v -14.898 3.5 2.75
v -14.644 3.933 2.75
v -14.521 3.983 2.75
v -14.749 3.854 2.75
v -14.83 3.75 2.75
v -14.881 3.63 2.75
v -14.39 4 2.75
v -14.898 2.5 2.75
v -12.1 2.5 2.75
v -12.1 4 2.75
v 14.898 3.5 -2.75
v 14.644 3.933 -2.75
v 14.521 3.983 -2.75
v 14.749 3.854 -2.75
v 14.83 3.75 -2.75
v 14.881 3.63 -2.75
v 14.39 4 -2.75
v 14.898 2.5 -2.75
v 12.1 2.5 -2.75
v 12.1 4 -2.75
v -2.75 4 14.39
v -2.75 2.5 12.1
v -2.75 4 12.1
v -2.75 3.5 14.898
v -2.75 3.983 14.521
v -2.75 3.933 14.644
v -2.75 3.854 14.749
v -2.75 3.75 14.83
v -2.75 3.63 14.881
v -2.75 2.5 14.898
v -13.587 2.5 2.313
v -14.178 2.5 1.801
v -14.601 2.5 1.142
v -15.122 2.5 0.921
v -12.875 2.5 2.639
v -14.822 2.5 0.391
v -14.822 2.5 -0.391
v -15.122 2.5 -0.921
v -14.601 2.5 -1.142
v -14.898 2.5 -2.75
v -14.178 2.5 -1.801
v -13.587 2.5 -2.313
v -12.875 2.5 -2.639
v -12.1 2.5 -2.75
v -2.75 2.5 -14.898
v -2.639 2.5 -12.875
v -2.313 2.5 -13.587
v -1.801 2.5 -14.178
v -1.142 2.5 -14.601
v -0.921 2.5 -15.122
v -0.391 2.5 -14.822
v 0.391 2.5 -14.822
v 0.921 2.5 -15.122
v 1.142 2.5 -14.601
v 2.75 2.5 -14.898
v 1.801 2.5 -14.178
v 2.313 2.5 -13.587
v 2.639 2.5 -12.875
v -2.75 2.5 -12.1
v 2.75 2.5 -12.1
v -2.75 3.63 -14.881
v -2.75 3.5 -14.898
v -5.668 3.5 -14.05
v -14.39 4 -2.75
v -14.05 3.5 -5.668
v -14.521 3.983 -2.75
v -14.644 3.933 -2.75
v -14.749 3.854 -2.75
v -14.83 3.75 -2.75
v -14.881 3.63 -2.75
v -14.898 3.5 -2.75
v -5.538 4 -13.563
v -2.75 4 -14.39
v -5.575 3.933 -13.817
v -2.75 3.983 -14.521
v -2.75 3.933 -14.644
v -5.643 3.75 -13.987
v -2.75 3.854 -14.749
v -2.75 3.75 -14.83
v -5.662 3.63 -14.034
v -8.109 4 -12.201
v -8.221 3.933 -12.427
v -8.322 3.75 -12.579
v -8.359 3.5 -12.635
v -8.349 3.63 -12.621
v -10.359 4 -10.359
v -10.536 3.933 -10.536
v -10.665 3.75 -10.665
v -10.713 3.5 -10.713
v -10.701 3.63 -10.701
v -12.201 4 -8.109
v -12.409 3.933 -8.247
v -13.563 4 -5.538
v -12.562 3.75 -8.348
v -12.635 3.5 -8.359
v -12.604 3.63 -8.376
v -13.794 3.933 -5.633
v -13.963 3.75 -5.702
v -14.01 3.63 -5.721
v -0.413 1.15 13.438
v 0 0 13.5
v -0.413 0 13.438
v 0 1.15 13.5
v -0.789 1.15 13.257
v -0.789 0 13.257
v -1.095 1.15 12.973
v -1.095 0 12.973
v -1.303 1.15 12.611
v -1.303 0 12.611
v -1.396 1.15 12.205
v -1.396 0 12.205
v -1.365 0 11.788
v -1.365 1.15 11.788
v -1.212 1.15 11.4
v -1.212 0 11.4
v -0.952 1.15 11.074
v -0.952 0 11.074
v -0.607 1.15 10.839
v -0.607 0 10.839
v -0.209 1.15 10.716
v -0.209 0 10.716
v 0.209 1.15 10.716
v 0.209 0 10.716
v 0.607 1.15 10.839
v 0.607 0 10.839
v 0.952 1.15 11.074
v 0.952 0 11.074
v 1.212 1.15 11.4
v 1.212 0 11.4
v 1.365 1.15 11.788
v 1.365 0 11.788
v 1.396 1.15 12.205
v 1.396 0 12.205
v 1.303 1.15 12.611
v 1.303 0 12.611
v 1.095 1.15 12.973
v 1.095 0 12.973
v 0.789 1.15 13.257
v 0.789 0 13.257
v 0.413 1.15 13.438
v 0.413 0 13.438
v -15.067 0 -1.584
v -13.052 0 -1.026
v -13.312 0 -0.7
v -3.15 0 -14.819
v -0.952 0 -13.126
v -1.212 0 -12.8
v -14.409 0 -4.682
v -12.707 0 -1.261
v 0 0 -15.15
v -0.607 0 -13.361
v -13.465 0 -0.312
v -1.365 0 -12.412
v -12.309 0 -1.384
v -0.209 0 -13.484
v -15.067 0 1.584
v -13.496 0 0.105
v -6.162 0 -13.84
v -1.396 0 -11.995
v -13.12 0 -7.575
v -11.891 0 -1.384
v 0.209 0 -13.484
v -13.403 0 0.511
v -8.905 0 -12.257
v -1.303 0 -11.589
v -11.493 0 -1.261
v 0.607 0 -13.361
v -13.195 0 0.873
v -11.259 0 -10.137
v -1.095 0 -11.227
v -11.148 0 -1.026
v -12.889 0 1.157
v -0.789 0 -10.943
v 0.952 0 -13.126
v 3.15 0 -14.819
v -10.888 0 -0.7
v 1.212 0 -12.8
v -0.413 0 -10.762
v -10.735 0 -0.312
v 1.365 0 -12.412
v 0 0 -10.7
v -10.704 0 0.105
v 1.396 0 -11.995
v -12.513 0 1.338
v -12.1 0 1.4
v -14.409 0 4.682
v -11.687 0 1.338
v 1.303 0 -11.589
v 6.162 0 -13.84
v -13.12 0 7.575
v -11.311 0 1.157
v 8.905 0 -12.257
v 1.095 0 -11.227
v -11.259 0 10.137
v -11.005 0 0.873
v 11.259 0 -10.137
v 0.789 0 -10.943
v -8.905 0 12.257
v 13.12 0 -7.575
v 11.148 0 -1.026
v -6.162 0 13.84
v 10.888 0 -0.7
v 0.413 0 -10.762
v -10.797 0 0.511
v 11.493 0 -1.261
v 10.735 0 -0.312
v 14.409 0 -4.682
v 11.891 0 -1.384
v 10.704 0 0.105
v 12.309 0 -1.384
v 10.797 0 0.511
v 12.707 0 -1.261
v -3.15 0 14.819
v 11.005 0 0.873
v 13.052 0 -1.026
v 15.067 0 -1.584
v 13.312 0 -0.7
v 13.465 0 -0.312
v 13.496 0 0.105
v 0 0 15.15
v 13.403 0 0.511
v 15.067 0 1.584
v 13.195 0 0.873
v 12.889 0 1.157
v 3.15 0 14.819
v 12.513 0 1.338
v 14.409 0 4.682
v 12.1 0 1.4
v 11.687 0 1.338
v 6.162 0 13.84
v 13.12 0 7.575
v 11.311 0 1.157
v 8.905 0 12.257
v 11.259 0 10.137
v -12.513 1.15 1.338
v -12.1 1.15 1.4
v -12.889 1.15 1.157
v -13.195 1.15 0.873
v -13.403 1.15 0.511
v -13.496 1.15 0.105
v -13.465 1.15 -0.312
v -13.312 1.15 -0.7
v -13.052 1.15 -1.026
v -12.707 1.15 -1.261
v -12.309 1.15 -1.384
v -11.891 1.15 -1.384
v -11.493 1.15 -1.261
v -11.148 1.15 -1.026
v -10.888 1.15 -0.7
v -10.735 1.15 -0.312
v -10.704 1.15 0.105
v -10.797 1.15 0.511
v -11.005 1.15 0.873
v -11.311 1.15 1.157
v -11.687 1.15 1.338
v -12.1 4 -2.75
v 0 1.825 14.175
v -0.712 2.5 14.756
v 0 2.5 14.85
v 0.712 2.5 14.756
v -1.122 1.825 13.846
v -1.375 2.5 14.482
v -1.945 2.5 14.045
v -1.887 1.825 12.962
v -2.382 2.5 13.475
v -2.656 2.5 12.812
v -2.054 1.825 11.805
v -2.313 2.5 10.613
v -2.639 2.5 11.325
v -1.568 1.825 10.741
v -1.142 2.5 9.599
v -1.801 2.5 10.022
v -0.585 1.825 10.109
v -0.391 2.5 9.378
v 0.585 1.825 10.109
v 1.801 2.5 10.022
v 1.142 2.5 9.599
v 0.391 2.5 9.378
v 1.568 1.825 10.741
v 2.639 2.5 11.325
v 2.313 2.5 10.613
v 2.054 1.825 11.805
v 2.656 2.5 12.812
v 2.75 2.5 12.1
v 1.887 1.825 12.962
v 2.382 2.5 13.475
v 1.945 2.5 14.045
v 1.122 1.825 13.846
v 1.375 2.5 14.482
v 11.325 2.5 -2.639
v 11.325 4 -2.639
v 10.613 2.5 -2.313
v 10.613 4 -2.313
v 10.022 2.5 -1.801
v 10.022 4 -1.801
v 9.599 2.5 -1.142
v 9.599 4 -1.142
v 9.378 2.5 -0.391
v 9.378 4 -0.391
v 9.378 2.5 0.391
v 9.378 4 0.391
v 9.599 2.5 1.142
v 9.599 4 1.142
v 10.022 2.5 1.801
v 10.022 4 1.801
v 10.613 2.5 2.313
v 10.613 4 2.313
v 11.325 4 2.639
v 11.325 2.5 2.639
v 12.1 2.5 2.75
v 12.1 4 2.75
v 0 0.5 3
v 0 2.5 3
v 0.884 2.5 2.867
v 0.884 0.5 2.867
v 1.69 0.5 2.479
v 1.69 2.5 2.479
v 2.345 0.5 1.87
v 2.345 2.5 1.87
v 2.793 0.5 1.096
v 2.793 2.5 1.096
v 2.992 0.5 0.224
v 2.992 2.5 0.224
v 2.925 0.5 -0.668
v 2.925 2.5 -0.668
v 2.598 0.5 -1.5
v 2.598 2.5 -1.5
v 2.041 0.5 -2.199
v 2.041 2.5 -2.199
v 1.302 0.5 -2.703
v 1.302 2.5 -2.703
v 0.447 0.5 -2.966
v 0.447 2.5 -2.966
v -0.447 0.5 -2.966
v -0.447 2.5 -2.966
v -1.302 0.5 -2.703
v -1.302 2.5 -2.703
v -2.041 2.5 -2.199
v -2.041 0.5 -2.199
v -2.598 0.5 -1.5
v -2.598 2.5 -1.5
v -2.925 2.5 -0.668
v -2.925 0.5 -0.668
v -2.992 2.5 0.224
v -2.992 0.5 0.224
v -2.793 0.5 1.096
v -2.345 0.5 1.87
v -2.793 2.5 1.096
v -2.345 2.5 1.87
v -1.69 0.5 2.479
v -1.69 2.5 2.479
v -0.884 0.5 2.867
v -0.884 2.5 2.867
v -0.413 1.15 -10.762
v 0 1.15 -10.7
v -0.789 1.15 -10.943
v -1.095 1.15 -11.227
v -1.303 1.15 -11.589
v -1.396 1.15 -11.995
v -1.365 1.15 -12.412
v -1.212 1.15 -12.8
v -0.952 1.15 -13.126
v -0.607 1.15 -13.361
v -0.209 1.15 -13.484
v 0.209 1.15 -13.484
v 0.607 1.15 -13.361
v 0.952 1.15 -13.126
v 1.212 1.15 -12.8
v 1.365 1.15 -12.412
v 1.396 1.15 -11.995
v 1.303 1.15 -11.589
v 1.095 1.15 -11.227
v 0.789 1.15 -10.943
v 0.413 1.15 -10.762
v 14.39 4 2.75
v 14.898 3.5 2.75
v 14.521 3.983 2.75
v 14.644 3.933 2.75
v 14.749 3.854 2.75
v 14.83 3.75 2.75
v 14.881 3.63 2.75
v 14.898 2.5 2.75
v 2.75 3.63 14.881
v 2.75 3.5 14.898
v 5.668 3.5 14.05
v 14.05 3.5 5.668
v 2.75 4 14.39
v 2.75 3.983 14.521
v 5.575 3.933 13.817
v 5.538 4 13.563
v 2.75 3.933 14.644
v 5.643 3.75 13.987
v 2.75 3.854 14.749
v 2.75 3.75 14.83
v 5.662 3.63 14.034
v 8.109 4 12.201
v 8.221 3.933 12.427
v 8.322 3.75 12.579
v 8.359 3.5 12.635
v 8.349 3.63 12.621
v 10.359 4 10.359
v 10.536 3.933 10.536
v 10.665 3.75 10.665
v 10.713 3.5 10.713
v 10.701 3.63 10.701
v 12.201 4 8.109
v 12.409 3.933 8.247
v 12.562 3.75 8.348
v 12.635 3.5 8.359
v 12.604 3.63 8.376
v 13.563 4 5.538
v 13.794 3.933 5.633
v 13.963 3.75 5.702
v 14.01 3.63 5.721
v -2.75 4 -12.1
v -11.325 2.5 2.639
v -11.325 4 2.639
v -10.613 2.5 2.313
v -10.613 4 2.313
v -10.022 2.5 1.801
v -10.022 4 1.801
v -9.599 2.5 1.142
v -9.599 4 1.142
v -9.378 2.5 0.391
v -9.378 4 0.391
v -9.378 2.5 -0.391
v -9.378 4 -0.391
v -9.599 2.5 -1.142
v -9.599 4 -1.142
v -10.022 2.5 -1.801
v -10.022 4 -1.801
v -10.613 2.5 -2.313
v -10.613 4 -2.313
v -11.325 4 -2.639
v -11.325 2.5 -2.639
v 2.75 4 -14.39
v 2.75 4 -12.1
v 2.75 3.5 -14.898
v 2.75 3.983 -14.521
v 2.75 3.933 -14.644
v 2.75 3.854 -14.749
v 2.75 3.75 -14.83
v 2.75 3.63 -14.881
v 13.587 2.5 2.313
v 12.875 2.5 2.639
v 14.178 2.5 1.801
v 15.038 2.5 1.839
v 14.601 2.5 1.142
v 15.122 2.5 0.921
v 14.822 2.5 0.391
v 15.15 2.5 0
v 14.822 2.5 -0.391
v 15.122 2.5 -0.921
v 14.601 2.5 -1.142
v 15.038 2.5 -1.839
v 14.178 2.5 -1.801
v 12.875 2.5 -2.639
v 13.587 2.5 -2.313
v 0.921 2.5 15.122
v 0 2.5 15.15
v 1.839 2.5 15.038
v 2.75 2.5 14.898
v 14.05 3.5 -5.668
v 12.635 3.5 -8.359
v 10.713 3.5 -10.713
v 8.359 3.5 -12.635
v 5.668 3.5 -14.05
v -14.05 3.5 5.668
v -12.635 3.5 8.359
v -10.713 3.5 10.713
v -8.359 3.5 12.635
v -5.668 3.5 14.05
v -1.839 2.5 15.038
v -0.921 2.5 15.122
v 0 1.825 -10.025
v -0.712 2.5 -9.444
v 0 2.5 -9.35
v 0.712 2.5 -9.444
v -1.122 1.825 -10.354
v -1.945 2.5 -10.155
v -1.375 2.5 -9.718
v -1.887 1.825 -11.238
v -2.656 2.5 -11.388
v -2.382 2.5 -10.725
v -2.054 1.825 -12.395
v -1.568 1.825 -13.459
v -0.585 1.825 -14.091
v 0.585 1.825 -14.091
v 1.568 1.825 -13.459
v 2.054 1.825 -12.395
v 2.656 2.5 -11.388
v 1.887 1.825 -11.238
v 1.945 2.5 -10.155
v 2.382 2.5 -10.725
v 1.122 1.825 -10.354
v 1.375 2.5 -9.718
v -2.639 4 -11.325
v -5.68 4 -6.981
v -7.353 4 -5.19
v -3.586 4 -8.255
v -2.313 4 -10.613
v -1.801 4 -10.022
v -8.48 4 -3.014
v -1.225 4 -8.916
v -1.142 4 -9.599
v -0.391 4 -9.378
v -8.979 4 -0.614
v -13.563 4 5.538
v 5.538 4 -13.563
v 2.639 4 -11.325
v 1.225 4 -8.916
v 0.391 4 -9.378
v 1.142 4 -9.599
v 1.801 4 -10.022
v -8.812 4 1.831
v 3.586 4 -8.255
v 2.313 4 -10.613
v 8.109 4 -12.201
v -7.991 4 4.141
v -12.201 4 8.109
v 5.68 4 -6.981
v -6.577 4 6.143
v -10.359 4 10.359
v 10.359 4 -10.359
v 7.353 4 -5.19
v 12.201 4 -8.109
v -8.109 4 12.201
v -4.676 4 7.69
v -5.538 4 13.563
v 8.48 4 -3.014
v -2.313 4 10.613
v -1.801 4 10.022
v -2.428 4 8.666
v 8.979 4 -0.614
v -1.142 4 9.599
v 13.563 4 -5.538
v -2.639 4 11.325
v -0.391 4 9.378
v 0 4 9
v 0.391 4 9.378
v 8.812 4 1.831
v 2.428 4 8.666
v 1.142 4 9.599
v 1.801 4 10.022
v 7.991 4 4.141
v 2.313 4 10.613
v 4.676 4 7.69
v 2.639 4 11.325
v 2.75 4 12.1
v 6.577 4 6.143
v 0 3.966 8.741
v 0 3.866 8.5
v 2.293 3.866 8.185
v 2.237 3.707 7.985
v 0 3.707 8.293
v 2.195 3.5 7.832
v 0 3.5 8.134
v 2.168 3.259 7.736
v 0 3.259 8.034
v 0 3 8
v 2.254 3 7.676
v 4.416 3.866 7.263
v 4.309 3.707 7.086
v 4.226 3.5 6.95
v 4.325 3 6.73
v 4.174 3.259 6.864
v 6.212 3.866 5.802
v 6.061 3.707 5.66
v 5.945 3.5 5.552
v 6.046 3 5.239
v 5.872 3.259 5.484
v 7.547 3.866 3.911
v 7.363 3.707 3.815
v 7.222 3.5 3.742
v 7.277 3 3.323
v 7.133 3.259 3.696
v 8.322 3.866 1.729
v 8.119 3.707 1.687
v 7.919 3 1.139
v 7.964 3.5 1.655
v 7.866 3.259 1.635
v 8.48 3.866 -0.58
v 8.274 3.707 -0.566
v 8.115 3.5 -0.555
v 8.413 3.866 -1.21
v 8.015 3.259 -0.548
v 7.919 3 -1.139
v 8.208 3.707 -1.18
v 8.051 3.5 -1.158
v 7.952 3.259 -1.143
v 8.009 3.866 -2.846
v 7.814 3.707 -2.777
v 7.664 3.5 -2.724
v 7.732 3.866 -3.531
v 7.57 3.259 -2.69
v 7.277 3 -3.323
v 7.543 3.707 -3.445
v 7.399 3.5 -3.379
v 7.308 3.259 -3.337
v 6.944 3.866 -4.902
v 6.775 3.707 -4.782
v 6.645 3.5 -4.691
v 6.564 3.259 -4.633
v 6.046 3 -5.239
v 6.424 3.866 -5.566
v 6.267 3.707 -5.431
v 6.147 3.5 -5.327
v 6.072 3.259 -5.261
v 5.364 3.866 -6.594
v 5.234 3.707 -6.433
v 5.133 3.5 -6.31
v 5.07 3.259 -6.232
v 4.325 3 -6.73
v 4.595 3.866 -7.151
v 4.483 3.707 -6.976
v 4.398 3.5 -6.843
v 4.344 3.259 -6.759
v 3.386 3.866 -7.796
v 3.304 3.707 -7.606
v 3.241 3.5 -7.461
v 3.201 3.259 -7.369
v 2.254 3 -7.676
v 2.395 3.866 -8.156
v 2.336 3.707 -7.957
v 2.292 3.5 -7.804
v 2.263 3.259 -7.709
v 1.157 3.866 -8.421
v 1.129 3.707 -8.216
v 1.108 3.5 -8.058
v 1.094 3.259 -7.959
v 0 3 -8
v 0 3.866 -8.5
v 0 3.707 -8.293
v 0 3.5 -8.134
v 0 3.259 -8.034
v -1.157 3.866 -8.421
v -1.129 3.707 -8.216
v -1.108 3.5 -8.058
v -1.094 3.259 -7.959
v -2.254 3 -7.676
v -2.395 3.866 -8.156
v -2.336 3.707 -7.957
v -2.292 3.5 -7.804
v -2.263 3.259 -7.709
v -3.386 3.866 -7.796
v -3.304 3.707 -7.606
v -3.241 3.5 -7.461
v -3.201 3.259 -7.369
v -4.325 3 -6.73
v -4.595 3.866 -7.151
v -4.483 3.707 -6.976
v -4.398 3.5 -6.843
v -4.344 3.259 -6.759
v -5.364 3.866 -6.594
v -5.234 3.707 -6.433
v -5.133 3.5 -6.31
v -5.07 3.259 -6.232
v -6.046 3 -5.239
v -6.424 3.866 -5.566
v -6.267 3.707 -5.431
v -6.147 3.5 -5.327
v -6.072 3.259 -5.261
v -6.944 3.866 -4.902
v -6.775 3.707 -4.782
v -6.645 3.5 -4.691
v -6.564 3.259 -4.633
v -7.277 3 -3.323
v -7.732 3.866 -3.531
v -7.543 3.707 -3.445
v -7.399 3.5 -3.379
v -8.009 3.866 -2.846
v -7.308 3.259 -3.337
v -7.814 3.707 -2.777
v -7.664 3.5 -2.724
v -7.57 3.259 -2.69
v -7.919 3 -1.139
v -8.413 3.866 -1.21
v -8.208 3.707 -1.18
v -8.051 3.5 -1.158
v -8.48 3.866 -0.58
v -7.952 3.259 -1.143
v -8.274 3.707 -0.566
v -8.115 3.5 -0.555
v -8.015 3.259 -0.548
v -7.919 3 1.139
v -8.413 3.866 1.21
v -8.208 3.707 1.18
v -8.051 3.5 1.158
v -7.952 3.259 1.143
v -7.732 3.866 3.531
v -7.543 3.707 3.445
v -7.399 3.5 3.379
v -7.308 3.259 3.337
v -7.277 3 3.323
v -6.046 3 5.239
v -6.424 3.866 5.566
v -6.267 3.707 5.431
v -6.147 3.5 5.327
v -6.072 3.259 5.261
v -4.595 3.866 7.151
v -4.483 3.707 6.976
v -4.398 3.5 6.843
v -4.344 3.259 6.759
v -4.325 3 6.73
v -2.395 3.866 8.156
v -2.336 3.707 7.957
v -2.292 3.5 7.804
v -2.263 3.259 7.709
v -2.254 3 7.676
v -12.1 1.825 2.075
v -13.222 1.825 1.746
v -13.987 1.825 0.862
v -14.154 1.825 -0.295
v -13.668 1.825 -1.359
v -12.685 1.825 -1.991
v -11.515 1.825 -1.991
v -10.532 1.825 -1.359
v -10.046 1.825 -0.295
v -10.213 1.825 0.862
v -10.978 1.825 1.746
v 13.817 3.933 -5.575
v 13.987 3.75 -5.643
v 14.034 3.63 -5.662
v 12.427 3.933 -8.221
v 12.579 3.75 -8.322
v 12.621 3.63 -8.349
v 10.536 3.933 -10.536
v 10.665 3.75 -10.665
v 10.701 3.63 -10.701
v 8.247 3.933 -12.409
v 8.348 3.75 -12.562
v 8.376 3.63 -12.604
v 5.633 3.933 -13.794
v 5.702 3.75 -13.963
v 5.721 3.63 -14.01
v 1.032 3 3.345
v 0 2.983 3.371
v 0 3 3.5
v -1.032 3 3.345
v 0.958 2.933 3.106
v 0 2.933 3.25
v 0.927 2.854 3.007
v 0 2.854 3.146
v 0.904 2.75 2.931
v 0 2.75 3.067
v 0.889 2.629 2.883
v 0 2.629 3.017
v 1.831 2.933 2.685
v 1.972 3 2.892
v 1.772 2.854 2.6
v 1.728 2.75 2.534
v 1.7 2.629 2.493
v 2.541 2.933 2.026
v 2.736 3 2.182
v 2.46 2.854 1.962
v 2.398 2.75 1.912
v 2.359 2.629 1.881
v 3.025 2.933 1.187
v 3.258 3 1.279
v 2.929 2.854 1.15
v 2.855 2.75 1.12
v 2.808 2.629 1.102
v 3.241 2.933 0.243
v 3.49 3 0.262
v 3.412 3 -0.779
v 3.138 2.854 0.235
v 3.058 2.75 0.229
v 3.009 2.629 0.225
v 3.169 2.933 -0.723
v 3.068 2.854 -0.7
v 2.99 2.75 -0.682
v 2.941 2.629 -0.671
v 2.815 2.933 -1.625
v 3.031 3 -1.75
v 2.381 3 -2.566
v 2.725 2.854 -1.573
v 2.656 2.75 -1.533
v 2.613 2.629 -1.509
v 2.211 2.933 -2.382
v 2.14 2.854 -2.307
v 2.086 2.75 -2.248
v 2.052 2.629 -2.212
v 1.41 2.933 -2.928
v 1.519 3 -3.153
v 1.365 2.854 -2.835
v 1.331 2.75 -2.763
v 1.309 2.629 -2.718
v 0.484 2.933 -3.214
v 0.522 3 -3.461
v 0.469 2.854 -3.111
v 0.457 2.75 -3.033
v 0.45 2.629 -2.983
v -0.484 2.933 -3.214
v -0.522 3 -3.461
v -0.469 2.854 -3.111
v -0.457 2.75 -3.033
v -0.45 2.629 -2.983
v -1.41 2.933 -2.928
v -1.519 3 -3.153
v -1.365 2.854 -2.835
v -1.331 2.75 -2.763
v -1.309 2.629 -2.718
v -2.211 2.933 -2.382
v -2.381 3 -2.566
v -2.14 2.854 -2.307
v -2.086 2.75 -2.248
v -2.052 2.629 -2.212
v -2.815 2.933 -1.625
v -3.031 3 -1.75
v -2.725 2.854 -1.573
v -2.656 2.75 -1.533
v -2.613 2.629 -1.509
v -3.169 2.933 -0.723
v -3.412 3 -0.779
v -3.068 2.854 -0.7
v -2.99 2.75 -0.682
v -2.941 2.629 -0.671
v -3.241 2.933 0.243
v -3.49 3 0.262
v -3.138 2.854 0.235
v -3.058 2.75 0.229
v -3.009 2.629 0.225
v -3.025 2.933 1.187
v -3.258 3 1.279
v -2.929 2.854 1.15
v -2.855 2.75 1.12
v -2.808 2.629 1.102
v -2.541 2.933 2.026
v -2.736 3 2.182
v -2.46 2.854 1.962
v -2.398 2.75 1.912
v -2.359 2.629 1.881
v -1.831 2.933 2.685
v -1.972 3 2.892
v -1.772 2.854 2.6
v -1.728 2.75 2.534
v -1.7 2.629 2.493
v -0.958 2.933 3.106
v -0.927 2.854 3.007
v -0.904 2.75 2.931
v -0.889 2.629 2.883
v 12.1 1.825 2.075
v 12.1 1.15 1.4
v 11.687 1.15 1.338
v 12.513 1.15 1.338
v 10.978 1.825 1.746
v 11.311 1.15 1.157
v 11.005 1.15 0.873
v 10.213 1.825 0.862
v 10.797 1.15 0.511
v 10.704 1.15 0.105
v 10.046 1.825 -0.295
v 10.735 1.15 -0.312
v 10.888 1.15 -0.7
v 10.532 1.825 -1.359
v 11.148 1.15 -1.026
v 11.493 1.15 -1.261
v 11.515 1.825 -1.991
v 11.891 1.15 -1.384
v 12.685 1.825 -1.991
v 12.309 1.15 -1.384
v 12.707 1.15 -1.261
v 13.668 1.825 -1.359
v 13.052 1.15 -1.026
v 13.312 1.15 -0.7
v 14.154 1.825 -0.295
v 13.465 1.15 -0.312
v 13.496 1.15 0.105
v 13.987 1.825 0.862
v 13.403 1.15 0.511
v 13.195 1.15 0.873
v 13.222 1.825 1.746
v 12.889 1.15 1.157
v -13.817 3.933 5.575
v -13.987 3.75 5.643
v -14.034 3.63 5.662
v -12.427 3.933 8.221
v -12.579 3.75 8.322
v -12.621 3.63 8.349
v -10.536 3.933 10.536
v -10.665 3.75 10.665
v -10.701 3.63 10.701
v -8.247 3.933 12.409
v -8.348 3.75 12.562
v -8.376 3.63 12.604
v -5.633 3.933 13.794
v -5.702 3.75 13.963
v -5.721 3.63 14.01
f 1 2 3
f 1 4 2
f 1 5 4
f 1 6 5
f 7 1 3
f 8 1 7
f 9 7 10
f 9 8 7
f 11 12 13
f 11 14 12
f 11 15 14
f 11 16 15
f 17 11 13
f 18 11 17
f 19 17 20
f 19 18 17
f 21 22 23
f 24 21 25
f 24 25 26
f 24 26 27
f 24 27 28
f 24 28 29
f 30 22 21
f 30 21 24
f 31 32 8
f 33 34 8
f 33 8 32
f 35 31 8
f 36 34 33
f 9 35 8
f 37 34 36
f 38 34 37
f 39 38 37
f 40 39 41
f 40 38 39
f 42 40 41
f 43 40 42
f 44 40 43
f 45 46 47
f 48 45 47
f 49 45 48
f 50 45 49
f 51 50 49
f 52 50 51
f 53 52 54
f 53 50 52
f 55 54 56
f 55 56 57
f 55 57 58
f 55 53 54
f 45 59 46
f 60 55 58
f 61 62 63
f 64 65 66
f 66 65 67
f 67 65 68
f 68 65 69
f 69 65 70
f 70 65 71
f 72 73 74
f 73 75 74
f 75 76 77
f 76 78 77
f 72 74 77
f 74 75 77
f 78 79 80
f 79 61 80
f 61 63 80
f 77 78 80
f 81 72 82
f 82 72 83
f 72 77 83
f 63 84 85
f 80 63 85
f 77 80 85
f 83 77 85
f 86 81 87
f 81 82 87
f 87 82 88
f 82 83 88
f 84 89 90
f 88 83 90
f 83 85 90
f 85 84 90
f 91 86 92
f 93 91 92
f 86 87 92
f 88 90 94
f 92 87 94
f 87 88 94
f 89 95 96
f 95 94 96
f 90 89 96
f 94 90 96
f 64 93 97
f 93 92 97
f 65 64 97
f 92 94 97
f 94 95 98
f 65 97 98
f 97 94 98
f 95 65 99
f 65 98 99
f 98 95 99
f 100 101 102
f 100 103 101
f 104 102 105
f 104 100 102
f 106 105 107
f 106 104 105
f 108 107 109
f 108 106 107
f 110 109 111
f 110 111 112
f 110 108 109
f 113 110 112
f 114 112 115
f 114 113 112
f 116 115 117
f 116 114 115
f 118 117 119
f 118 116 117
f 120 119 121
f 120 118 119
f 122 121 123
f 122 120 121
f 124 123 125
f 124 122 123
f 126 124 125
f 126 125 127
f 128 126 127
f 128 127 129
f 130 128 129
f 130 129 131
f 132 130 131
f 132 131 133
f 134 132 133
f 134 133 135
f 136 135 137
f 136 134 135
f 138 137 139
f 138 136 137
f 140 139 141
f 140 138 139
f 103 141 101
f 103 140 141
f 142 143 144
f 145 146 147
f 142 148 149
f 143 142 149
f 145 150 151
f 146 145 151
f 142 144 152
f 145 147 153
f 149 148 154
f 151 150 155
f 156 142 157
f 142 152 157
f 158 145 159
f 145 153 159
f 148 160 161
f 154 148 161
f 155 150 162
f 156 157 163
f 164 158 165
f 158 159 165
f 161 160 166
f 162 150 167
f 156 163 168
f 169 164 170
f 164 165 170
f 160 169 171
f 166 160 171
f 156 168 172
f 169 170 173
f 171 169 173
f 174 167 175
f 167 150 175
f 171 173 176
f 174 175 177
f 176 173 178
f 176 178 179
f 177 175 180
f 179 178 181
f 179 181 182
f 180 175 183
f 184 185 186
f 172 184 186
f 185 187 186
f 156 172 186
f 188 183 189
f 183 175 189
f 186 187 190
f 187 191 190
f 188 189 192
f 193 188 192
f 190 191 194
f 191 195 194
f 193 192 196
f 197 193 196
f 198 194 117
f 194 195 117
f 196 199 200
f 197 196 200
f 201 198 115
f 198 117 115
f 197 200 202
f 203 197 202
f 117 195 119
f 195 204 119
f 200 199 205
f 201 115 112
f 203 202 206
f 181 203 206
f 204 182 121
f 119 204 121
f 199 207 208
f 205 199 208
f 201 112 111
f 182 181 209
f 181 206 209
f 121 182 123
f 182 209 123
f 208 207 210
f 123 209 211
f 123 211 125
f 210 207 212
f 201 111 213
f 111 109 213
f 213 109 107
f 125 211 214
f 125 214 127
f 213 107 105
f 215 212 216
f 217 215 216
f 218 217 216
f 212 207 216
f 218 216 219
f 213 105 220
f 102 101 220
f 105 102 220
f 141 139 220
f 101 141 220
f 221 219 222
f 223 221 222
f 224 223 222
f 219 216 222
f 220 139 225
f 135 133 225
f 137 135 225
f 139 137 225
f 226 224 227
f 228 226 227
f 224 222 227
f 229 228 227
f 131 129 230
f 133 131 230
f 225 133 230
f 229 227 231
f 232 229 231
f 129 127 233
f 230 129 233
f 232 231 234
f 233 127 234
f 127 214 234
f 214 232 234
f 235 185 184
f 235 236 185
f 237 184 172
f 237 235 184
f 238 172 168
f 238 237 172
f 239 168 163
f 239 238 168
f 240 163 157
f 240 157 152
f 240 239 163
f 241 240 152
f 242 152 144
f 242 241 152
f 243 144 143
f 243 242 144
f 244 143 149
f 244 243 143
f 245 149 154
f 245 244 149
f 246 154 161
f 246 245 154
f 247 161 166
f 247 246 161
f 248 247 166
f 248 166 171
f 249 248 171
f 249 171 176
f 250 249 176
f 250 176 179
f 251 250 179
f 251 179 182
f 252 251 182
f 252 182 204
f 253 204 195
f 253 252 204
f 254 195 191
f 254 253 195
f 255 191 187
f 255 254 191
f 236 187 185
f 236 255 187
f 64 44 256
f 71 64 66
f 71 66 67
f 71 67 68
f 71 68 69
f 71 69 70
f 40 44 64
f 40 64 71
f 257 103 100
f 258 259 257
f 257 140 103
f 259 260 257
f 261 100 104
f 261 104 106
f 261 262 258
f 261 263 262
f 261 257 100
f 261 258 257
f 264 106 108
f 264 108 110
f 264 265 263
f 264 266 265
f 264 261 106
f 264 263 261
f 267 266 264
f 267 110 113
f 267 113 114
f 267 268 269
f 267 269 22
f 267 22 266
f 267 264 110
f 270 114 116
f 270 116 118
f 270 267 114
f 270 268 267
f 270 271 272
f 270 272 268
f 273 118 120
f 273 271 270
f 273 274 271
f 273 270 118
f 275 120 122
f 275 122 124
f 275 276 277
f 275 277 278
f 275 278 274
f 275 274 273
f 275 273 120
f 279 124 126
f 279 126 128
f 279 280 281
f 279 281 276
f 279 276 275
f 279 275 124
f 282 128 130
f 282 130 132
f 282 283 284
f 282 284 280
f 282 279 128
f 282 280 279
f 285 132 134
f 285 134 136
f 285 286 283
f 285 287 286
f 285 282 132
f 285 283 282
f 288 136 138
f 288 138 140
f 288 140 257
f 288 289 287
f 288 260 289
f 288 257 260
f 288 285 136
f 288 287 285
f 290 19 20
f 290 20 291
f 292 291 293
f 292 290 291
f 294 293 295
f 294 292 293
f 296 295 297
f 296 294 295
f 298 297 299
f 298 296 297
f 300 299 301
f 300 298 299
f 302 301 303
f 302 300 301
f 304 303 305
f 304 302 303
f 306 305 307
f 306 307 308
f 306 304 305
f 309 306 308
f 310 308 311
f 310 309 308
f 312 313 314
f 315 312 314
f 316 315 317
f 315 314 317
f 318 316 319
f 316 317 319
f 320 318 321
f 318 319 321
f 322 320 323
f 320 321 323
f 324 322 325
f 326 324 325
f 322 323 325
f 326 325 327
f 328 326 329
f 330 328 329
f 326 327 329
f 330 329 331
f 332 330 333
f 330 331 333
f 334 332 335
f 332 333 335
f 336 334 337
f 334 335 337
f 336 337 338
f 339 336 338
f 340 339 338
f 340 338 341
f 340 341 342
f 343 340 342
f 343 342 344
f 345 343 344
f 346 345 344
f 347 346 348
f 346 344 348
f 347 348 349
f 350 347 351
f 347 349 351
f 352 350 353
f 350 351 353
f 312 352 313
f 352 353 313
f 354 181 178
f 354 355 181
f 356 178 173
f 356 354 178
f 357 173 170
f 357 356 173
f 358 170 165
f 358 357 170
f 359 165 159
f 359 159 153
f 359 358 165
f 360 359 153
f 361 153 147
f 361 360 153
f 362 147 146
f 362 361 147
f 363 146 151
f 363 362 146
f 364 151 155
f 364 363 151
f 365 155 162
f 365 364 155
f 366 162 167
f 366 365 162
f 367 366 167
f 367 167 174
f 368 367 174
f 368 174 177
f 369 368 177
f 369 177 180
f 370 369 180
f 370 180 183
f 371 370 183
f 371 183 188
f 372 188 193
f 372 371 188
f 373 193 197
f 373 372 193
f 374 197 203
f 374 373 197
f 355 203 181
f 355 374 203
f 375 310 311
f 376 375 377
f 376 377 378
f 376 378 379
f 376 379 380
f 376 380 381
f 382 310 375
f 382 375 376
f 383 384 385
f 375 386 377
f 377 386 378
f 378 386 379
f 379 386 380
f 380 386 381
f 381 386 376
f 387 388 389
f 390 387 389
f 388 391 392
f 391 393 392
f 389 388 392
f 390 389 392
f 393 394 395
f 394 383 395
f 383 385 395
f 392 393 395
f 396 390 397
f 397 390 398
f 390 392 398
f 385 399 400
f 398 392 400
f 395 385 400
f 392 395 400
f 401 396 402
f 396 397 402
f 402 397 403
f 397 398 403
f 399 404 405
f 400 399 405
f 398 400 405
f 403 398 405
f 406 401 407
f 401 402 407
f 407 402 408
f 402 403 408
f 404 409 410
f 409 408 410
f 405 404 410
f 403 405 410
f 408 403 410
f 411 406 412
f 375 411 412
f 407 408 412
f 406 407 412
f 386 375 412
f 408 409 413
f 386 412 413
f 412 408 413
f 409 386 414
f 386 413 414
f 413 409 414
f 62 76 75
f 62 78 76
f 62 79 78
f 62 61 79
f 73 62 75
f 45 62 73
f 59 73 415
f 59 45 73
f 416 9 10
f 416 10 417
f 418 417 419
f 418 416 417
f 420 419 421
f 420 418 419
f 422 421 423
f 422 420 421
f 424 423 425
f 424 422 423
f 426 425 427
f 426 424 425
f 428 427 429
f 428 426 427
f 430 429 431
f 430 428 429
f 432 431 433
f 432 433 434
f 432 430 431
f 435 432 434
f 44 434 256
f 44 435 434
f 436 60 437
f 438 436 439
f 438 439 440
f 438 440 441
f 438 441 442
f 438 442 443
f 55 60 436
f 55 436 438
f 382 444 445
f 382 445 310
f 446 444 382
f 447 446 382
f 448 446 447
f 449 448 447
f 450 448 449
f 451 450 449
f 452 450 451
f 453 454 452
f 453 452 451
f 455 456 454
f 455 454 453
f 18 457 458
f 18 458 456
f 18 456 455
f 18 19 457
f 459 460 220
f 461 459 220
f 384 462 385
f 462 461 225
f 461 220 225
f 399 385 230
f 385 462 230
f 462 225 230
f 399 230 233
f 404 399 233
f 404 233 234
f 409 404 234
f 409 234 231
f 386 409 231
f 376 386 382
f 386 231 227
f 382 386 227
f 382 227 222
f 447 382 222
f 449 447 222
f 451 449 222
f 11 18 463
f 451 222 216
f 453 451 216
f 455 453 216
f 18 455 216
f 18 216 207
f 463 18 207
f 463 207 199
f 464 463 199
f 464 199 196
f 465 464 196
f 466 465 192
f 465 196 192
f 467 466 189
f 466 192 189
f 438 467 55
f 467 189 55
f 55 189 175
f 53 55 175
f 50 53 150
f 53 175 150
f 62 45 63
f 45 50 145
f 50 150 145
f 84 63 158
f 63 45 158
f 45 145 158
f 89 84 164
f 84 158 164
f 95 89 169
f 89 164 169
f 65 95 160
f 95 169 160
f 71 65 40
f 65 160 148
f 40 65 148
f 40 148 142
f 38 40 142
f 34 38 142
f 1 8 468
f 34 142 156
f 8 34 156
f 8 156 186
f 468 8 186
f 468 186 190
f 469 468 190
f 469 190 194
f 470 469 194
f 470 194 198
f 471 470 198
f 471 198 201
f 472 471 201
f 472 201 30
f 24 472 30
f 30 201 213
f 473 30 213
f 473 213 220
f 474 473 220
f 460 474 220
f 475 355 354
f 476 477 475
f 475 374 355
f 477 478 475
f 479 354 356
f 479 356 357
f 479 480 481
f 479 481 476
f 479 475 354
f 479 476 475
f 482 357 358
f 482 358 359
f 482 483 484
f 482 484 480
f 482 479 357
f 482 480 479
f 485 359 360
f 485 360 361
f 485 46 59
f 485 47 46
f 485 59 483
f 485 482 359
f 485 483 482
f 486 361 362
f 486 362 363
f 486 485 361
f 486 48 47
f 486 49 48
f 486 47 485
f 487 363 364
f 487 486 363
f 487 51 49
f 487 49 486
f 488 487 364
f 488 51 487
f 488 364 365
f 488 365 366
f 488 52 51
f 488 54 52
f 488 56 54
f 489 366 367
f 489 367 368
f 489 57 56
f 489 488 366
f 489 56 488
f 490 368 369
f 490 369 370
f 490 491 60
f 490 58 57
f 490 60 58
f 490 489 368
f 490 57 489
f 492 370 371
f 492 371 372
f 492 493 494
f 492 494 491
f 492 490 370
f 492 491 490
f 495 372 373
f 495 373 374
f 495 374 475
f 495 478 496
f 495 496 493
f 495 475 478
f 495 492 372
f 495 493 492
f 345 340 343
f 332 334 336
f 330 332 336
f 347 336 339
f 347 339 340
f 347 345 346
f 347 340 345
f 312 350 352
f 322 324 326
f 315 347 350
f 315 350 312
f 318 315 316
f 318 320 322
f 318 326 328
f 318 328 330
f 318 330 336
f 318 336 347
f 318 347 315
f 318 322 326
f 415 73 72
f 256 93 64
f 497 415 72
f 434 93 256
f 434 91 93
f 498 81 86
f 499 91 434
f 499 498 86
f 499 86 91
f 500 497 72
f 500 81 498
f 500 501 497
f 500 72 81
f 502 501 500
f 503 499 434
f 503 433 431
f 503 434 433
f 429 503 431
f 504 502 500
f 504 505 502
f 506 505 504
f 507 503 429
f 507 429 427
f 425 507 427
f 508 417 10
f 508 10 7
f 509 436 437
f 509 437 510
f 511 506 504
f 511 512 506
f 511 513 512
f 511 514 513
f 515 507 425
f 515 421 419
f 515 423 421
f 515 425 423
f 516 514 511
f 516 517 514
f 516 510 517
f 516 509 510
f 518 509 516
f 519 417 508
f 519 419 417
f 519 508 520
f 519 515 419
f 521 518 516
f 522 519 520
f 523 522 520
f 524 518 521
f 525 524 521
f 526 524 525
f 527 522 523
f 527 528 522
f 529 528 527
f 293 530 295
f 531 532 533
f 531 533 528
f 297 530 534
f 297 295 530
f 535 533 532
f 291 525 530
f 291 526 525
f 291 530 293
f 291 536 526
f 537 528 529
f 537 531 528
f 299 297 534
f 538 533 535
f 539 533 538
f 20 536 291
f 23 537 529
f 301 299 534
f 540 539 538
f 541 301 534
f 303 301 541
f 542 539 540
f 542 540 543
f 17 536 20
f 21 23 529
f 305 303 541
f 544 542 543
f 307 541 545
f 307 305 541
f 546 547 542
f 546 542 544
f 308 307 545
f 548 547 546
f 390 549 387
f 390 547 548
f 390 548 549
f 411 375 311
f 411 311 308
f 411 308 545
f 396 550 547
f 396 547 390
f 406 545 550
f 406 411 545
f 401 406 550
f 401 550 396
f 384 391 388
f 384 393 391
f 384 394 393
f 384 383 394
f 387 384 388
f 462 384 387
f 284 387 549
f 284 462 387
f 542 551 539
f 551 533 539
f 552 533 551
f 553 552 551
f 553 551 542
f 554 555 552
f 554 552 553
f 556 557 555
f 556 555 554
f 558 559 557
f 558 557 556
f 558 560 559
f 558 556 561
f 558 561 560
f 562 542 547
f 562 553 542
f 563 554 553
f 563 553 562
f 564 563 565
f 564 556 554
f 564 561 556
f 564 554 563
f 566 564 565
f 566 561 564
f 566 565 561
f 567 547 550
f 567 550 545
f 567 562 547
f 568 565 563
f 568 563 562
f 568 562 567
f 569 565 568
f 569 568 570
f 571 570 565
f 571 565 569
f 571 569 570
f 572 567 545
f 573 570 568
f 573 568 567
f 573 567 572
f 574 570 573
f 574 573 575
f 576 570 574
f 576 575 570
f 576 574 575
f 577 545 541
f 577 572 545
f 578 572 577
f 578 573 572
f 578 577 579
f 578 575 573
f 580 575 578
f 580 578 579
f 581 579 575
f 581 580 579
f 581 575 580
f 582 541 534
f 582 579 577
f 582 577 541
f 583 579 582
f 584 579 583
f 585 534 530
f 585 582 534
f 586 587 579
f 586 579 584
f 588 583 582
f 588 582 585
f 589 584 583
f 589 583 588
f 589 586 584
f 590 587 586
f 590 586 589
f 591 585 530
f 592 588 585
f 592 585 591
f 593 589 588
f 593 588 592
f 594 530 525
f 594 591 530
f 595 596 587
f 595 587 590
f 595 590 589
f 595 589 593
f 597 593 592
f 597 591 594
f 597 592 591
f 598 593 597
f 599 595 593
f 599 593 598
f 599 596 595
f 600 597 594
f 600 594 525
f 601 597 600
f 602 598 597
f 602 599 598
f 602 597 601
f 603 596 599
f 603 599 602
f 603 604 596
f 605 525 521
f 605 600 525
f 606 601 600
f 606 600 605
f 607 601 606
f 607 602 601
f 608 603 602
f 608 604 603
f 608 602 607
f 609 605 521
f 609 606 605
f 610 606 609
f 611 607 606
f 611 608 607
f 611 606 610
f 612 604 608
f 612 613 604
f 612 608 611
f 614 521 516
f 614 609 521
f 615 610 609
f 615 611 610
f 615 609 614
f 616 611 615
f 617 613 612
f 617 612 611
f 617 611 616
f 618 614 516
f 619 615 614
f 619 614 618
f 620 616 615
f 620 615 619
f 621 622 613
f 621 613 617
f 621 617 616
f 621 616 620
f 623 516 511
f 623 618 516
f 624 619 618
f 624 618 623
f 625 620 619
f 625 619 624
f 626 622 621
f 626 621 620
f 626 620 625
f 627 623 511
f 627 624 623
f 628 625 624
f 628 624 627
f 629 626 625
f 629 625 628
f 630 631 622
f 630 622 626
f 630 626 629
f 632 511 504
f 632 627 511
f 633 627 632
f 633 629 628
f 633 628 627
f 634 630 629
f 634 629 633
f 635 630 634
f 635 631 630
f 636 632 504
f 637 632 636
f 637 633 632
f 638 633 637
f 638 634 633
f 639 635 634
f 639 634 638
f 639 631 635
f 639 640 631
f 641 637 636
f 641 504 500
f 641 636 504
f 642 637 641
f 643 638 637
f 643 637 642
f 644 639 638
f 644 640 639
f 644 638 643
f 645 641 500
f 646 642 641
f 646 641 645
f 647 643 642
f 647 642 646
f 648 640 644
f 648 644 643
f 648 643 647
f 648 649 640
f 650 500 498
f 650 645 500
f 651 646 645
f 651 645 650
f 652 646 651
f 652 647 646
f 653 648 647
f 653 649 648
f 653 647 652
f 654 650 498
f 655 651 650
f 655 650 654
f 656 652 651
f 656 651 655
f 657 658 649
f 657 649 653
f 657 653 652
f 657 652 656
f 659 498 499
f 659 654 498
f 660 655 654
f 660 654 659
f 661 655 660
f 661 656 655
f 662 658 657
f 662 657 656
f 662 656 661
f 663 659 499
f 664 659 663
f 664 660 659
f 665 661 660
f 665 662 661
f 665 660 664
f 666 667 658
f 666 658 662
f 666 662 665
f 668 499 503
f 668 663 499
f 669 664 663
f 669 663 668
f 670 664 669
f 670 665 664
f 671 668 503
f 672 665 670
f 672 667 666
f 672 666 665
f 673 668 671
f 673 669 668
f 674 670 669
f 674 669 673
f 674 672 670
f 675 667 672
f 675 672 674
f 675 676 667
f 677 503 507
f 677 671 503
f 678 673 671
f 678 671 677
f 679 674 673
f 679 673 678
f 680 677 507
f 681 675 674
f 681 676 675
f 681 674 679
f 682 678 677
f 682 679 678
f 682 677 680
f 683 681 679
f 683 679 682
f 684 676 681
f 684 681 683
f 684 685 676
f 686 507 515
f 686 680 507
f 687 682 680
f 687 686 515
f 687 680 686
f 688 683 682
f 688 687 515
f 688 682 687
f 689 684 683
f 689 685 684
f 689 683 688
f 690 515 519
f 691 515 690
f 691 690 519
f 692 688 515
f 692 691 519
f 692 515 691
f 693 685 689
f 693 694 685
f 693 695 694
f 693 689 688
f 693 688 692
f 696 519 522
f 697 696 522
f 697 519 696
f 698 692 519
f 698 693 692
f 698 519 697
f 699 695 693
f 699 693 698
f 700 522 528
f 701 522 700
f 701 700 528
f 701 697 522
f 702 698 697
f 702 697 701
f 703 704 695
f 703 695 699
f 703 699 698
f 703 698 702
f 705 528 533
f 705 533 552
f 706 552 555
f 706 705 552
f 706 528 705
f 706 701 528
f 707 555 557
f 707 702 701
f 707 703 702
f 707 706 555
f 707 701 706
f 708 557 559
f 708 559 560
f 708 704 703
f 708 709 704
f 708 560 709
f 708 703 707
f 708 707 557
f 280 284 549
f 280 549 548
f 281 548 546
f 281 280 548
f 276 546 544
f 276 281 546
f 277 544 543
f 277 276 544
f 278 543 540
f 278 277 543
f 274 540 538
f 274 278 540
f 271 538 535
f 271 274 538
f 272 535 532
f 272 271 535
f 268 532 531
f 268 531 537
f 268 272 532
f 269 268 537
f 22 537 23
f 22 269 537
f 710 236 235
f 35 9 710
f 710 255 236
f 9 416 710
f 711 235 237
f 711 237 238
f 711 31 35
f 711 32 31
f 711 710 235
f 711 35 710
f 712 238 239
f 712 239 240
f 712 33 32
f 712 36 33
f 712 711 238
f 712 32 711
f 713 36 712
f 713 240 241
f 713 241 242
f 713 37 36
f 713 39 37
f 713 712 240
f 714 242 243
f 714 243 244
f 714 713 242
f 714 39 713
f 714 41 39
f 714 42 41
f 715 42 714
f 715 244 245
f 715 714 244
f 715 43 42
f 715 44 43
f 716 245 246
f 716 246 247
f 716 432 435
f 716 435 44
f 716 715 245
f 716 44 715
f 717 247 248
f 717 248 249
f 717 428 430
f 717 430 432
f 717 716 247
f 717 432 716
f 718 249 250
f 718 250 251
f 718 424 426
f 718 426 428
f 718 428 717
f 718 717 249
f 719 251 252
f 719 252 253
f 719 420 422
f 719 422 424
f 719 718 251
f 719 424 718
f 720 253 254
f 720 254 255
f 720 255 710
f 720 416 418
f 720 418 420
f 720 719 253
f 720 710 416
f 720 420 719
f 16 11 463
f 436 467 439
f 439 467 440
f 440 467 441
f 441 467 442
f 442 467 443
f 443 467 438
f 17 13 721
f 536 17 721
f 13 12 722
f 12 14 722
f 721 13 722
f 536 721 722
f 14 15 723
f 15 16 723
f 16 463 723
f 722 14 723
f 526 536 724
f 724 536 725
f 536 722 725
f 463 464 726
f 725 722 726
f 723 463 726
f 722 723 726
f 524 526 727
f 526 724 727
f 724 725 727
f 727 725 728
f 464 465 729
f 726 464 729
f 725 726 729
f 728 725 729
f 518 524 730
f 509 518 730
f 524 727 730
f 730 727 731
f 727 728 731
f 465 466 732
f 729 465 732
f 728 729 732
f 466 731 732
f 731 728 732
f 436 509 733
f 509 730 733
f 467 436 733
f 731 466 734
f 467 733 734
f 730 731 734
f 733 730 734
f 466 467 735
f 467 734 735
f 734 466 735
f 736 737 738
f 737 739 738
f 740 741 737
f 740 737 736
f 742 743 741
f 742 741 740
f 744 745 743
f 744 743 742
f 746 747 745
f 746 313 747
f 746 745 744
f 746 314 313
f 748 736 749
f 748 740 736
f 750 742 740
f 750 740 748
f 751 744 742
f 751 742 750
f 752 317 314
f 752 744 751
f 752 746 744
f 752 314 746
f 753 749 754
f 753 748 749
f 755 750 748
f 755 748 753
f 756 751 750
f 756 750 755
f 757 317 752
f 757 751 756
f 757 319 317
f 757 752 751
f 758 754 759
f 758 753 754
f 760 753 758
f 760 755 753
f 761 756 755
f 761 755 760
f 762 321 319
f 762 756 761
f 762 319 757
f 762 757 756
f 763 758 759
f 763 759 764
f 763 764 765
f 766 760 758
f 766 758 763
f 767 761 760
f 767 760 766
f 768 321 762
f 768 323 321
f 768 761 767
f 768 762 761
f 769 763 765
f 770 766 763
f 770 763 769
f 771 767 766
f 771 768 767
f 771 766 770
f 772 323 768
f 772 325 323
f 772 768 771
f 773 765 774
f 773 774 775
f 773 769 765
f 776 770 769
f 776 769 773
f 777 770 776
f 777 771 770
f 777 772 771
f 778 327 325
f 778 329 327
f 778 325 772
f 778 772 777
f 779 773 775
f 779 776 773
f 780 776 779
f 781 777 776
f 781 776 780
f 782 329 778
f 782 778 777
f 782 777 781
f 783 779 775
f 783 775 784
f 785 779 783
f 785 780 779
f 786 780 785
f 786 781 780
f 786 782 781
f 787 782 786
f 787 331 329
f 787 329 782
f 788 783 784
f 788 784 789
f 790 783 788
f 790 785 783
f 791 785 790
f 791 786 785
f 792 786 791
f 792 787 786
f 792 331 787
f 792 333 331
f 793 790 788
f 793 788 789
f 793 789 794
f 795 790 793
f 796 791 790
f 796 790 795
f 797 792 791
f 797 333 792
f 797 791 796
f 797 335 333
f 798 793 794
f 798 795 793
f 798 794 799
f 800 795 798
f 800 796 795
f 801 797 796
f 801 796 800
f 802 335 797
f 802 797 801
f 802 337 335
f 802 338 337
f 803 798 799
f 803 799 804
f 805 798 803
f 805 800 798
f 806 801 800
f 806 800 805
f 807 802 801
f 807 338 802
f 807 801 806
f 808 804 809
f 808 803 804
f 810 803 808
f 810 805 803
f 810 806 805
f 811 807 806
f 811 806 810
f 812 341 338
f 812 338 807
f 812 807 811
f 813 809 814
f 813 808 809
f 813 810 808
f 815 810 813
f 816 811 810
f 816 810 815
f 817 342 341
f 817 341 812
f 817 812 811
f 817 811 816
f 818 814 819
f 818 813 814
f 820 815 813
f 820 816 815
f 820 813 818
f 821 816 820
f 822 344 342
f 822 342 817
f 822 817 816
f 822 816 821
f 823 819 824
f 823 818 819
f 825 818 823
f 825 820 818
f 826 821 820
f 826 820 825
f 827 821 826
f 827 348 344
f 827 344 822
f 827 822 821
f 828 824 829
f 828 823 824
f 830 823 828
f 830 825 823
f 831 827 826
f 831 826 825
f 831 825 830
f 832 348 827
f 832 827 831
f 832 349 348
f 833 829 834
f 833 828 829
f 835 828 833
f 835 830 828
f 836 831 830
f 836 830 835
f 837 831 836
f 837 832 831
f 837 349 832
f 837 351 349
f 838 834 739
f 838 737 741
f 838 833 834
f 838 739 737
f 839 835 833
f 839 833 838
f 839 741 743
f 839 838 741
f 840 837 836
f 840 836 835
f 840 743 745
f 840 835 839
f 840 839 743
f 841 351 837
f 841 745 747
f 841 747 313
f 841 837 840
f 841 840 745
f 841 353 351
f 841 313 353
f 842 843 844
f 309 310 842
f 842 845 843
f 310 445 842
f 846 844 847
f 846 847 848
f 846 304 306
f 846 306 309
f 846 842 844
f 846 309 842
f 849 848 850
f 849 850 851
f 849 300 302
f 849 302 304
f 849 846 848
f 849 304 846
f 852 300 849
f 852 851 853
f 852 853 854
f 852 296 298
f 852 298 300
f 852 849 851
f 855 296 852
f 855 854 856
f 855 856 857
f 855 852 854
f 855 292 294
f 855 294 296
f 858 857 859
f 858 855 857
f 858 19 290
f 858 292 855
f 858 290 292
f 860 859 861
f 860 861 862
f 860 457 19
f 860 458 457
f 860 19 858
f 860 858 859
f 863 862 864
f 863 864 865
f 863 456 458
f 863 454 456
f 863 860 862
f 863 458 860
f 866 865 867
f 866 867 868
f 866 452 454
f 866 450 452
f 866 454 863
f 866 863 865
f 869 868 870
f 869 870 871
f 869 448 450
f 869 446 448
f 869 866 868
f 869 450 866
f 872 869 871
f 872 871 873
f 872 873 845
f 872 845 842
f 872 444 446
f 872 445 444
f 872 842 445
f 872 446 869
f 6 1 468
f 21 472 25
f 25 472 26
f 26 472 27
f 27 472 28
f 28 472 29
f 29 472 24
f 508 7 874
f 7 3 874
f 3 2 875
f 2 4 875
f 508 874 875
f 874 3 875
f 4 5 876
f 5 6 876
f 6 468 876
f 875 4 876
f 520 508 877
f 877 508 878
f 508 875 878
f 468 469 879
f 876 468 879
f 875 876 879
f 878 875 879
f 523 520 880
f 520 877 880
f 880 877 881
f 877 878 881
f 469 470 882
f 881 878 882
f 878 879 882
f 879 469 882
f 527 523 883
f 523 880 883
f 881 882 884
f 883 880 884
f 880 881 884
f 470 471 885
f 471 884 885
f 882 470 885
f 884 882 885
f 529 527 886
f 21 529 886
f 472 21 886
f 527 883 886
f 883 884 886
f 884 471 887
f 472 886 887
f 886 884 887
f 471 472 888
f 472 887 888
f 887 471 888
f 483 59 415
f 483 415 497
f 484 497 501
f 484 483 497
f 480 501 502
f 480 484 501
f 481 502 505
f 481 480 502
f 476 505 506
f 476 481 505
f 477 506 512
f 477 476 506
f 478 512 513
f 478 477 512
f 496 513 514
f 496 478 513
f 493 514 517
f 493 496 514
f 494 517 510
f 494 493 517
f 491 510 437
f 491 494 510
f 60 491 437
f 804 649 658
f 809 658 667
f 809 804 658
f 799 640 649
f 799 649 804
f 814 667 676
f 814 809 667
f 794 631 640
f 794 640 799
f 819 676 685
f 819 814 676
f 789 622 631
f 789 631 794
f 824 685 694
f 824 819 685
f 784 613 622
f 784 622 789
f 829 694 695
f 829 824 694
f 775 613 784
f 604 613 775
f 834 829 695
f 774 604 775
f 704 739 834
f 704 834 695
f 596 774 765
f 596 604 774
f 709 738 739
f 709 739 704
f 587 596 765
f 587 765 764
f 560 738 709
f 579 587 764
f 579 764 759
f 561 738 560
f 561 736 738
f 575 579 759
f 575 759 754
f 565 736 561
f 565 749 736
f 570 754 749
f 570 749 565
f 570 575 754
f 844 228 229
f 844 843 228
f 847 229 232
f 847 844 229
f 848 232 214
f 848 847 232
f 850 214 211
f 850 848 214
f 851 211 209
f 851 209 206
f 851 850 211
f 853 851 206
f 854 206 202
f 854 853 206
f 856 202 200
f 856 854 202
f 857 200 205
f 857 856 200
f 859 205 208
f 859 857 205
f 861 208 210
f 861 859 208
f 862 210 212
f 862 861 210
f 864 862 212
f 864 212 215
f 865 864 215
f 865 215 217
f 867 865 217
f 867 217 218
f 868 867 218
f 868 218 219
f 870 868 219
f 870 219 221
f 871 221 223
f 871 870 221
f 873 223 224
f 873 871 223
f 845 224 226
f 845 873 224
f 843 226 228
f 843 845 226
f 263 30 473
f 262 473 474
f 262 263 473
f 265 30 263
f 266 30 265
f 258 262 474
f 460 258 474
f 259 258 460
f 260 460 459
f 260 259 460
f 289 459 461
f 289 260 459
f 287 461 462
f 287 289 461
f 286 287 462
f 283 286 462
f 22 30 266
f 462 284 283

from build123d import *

# Parameters (mm, degrees)
SKETCH1_R                                      = 15.15
BOSS_EXTRUDE1_DEPTH                            = 4
SKETCH4_R                                      = 8
CUT_EXTRUDE3_DEPTH                             = 1
SKETCH5_R                                      = 3
CUT_EXTRUDE4_DEPTH                             = 2.5
FILLET1_R                                      = 1
FILLET2_R                                      = 0.5
FILLET3_R                                      = 0.5
CUT_EXTRUDE5_START                             = -1.5
CUT_EXTRUDE5_DEPTH                             = 1.5
CSK_FOR_M2_5_FLAT_HEAD_MACHINE_SCREW1_AT_COUNT = 2
CSK_FOR_M2_5_FLAT_HEAD_MACHINE_SCREW1_AT_PITCH = 17.111984105
CSK_FOR_M2_5_FLAT_HEAD_MACHINE_SCREW_2_COUNT   = 2
CSK_FOR_M2_5_FLAT_HEAD_MACHINE_SCREW_2_PITCH   = 17.111984105
CSK_FOR_M2_5_FLAT_HEAD_MACHINE_SCREW_3_COUNT   = 2
CSK_FOR_M2_5_FLAT_HEAD_MACHINE_SCREW_3_PITCH   = 24.2


with BuildPart() as part:
    # Sketch1 → Boss-Extrude1 (new body)
    with BuildSketch(Plane(origin=(0, 0, 0), x_dir=(1, 0, 0), z_dir=(0, 1, 0))):
        with Locations(Location((0, 0, 0), (0, 0, 270))):
            Circle(SKETCH1_R)
    extrude(amount=BOSS_EXTRUDE1_DEPTH)

    # Sketch4 → Cut-Extrude3 (cut)
    with BuildSketch(Plane(origin=(0, 4, 0), x_dir=(1, 0, 0), z_dir=(0, 1, 0))):
        with Locations(Location((0, 0, 0), (0, 0, 270))):
            Circle(SKETCH4_R)
    extrude(amount=-CUT_EXTRUDE3_DEPTH, mode=Mode.SUBTRACT)

    # Sketch5 → Cut-Extrude4 (cut)
    with BuildSketch(Plane(origin=(0, 3, 0), x_dir=(1, 0, 0), z_dir=(0, 1, 0))):
        with Locations(Location((0, 0, 0), (0, 0, 270))):
            Circle(SKETCH5_R)
    extrude(amount=-CUT_EXTRUDE4_DEPTH, mode=Mode.SUBTRACT)

    # Fillet1
    fillet1_edges = [part.edges().sort_by_distance(p)[0] for p in [
        (0, 4, -8),
    ]]
    fillet(fillet1_edges, radius=FILLET1_R - 0.0001)  # a hair under: the kernel refuses the full size

    # Fillet2
    fillet2_edges = [part.edges().sort_by_distance(p)[0] for p in [
        (0, 3, -3),
    ]]
    fillet(fillet2_edges, radius=FILLET2_R)

    # Fillet3
    fillet3_edges = [part.edges().sort_by_distance(p)[0] for p in [
        (0, 4, -15.15),
    ]]
    fillet(fillet3_edges, radius=FILLET3_R)

    # Sketch2<2> → Cut-Extrude5 (cut)
    with BuildSketch(Plane(origin=(0, 4, 0), x_dir=(1, 0, 0), z_dir=(0, 1, 0)).offset(CUT_EXTRUDE5_START)):
        with BuildLine():
            Line((-12.1, 2.75), (-14.898322053, 2.75))
            ThreePointArc((-14.898322053, 2.75), (-15.15, 0), (-14.898322053, -2.75))
            Line((-14.898322053, -2.75), (-12.1, -2.75))
            ThreePointArc((-12.1, -2.75), (-9.35, 0), (-12.1, 2.75))
        make_face()
        with BuildLine():
            Line((-2.75, -12.1), (-2.75, -14.898322053))
            ThreePointArc((-2.75, -14.898322053), (0, -15.15), (2.75, -14.898322053))
            Line((2.75, -14.898322053), (2.75, -12.1))
            ThreePointArc((2.75, -12.1), (0, -9.35), (-2.75, -12.1))
        make_face()
        with BuildLine():
            ThreePointArc((15.15, 0), (15.086949312, 1.380746337), (14.898322053, 2.75))
            Line((14.898322053, 2.75), (12.1, 2.75))
            ThreePointArc((12.1, 2.75), (9.35, 0), (12.1, -2.75))
            Line((12.1, -2.75), (14.898322053, -2.75))
            ThreePointArc((14.898322053, -2.75), (15.086949312, -1.380746337), (15.15, 0))
        make_face()
        with BuildLine():
            ThreePointArc((-2.75, 12.1), (0, 9.35), (2.75, 12.1))
            Line((2.75, 12.1), (2.75, 14.898322053))
            ThreePointArc((2.75, 14.898322053), (0, 15.15), (-2.75, 14.898322053))
            Line((-2.75, 14.898322053), (-2.75, 12.1))
        make_face()
    extrude(amount=CUT_EXTRUDE5_DEPTH, mode=Mode.SUBTRACT)

    # Sketch7 → CSK for M2.5 Flat Head Machine Screw1 (revolve, cut)
    with BuildSketch(Plane(origin=(0, 2.5, -12.1), x_dir=(0, 0, 1), z_dir=(1, 0, 0))):
        Polygon((0, 0), (0, 2.5), (1.4, 2.5), (1.4, 1.35), (2.75, 0), align=None)
    csk_for_m2_5_flat_head_machine_screw1 = revolve(axis=Axis((0, 8.85, -12.1), (0, -1, 0)), mode=Mode.SUBTRACT)

    # CSK for M2.5 Flat Head Machine Screw1 at: CSK for M2.5 Flat Head Machine Screw1 ×2
    with Locations(*[Vector(-0.7071067811865512, 0, 0.7071067811865439) * (i * CSK_FOR_M2_5_FLAT_HEAD_MACHINE_SCREW1_AT_PITCH) for i in range(1, CSK_FOR_M2_5_FLAT_HEAD_MACHINE_SCREW1_AT_COUNT)]):
        add(csk_for_m2_5_flat_head_machine_screw1, mode=Mode.SUBTRACT)

    # CSK for M2.5 Flat Head Machine Screw 2: CSK for M2.5 Flat Head Machine Screw1 ×2
    with Locations(*[Vector(0.7071067811865464, 0, 0.7071067811865488) * (i * CSK_FOR_M2_5_FLAT_HEAD_MACHINE_SCREW_2_PITCH) for i in range(1, CSK_FOR_M2_5_FLAT_HEAD_MACHINE_SCREW_2_COUNT)]):
        add(csk_for_m2_5_flat_head_machine_screw1, mode=Mode.SUBTRACT)

    # CSK for M2.5 Flat Head Machine Screw 3: CSK for M2.5 Flat Head Machine Screw1 ×2
    with Locations(*[(0, 0, i * CSK_FOR_M2_5_FLAT_HEAD_MACHINE_SCREW_3_PITCH) for i in range(1, CSK_FOR_M2_5_FLAT_HEAD_MACHINE_SCREW_3_COUNT)]):
        add(csk_for_m2_5_flat_head_machine_screw1, mode=Mode.SUBTRACT)


solid = part.part
